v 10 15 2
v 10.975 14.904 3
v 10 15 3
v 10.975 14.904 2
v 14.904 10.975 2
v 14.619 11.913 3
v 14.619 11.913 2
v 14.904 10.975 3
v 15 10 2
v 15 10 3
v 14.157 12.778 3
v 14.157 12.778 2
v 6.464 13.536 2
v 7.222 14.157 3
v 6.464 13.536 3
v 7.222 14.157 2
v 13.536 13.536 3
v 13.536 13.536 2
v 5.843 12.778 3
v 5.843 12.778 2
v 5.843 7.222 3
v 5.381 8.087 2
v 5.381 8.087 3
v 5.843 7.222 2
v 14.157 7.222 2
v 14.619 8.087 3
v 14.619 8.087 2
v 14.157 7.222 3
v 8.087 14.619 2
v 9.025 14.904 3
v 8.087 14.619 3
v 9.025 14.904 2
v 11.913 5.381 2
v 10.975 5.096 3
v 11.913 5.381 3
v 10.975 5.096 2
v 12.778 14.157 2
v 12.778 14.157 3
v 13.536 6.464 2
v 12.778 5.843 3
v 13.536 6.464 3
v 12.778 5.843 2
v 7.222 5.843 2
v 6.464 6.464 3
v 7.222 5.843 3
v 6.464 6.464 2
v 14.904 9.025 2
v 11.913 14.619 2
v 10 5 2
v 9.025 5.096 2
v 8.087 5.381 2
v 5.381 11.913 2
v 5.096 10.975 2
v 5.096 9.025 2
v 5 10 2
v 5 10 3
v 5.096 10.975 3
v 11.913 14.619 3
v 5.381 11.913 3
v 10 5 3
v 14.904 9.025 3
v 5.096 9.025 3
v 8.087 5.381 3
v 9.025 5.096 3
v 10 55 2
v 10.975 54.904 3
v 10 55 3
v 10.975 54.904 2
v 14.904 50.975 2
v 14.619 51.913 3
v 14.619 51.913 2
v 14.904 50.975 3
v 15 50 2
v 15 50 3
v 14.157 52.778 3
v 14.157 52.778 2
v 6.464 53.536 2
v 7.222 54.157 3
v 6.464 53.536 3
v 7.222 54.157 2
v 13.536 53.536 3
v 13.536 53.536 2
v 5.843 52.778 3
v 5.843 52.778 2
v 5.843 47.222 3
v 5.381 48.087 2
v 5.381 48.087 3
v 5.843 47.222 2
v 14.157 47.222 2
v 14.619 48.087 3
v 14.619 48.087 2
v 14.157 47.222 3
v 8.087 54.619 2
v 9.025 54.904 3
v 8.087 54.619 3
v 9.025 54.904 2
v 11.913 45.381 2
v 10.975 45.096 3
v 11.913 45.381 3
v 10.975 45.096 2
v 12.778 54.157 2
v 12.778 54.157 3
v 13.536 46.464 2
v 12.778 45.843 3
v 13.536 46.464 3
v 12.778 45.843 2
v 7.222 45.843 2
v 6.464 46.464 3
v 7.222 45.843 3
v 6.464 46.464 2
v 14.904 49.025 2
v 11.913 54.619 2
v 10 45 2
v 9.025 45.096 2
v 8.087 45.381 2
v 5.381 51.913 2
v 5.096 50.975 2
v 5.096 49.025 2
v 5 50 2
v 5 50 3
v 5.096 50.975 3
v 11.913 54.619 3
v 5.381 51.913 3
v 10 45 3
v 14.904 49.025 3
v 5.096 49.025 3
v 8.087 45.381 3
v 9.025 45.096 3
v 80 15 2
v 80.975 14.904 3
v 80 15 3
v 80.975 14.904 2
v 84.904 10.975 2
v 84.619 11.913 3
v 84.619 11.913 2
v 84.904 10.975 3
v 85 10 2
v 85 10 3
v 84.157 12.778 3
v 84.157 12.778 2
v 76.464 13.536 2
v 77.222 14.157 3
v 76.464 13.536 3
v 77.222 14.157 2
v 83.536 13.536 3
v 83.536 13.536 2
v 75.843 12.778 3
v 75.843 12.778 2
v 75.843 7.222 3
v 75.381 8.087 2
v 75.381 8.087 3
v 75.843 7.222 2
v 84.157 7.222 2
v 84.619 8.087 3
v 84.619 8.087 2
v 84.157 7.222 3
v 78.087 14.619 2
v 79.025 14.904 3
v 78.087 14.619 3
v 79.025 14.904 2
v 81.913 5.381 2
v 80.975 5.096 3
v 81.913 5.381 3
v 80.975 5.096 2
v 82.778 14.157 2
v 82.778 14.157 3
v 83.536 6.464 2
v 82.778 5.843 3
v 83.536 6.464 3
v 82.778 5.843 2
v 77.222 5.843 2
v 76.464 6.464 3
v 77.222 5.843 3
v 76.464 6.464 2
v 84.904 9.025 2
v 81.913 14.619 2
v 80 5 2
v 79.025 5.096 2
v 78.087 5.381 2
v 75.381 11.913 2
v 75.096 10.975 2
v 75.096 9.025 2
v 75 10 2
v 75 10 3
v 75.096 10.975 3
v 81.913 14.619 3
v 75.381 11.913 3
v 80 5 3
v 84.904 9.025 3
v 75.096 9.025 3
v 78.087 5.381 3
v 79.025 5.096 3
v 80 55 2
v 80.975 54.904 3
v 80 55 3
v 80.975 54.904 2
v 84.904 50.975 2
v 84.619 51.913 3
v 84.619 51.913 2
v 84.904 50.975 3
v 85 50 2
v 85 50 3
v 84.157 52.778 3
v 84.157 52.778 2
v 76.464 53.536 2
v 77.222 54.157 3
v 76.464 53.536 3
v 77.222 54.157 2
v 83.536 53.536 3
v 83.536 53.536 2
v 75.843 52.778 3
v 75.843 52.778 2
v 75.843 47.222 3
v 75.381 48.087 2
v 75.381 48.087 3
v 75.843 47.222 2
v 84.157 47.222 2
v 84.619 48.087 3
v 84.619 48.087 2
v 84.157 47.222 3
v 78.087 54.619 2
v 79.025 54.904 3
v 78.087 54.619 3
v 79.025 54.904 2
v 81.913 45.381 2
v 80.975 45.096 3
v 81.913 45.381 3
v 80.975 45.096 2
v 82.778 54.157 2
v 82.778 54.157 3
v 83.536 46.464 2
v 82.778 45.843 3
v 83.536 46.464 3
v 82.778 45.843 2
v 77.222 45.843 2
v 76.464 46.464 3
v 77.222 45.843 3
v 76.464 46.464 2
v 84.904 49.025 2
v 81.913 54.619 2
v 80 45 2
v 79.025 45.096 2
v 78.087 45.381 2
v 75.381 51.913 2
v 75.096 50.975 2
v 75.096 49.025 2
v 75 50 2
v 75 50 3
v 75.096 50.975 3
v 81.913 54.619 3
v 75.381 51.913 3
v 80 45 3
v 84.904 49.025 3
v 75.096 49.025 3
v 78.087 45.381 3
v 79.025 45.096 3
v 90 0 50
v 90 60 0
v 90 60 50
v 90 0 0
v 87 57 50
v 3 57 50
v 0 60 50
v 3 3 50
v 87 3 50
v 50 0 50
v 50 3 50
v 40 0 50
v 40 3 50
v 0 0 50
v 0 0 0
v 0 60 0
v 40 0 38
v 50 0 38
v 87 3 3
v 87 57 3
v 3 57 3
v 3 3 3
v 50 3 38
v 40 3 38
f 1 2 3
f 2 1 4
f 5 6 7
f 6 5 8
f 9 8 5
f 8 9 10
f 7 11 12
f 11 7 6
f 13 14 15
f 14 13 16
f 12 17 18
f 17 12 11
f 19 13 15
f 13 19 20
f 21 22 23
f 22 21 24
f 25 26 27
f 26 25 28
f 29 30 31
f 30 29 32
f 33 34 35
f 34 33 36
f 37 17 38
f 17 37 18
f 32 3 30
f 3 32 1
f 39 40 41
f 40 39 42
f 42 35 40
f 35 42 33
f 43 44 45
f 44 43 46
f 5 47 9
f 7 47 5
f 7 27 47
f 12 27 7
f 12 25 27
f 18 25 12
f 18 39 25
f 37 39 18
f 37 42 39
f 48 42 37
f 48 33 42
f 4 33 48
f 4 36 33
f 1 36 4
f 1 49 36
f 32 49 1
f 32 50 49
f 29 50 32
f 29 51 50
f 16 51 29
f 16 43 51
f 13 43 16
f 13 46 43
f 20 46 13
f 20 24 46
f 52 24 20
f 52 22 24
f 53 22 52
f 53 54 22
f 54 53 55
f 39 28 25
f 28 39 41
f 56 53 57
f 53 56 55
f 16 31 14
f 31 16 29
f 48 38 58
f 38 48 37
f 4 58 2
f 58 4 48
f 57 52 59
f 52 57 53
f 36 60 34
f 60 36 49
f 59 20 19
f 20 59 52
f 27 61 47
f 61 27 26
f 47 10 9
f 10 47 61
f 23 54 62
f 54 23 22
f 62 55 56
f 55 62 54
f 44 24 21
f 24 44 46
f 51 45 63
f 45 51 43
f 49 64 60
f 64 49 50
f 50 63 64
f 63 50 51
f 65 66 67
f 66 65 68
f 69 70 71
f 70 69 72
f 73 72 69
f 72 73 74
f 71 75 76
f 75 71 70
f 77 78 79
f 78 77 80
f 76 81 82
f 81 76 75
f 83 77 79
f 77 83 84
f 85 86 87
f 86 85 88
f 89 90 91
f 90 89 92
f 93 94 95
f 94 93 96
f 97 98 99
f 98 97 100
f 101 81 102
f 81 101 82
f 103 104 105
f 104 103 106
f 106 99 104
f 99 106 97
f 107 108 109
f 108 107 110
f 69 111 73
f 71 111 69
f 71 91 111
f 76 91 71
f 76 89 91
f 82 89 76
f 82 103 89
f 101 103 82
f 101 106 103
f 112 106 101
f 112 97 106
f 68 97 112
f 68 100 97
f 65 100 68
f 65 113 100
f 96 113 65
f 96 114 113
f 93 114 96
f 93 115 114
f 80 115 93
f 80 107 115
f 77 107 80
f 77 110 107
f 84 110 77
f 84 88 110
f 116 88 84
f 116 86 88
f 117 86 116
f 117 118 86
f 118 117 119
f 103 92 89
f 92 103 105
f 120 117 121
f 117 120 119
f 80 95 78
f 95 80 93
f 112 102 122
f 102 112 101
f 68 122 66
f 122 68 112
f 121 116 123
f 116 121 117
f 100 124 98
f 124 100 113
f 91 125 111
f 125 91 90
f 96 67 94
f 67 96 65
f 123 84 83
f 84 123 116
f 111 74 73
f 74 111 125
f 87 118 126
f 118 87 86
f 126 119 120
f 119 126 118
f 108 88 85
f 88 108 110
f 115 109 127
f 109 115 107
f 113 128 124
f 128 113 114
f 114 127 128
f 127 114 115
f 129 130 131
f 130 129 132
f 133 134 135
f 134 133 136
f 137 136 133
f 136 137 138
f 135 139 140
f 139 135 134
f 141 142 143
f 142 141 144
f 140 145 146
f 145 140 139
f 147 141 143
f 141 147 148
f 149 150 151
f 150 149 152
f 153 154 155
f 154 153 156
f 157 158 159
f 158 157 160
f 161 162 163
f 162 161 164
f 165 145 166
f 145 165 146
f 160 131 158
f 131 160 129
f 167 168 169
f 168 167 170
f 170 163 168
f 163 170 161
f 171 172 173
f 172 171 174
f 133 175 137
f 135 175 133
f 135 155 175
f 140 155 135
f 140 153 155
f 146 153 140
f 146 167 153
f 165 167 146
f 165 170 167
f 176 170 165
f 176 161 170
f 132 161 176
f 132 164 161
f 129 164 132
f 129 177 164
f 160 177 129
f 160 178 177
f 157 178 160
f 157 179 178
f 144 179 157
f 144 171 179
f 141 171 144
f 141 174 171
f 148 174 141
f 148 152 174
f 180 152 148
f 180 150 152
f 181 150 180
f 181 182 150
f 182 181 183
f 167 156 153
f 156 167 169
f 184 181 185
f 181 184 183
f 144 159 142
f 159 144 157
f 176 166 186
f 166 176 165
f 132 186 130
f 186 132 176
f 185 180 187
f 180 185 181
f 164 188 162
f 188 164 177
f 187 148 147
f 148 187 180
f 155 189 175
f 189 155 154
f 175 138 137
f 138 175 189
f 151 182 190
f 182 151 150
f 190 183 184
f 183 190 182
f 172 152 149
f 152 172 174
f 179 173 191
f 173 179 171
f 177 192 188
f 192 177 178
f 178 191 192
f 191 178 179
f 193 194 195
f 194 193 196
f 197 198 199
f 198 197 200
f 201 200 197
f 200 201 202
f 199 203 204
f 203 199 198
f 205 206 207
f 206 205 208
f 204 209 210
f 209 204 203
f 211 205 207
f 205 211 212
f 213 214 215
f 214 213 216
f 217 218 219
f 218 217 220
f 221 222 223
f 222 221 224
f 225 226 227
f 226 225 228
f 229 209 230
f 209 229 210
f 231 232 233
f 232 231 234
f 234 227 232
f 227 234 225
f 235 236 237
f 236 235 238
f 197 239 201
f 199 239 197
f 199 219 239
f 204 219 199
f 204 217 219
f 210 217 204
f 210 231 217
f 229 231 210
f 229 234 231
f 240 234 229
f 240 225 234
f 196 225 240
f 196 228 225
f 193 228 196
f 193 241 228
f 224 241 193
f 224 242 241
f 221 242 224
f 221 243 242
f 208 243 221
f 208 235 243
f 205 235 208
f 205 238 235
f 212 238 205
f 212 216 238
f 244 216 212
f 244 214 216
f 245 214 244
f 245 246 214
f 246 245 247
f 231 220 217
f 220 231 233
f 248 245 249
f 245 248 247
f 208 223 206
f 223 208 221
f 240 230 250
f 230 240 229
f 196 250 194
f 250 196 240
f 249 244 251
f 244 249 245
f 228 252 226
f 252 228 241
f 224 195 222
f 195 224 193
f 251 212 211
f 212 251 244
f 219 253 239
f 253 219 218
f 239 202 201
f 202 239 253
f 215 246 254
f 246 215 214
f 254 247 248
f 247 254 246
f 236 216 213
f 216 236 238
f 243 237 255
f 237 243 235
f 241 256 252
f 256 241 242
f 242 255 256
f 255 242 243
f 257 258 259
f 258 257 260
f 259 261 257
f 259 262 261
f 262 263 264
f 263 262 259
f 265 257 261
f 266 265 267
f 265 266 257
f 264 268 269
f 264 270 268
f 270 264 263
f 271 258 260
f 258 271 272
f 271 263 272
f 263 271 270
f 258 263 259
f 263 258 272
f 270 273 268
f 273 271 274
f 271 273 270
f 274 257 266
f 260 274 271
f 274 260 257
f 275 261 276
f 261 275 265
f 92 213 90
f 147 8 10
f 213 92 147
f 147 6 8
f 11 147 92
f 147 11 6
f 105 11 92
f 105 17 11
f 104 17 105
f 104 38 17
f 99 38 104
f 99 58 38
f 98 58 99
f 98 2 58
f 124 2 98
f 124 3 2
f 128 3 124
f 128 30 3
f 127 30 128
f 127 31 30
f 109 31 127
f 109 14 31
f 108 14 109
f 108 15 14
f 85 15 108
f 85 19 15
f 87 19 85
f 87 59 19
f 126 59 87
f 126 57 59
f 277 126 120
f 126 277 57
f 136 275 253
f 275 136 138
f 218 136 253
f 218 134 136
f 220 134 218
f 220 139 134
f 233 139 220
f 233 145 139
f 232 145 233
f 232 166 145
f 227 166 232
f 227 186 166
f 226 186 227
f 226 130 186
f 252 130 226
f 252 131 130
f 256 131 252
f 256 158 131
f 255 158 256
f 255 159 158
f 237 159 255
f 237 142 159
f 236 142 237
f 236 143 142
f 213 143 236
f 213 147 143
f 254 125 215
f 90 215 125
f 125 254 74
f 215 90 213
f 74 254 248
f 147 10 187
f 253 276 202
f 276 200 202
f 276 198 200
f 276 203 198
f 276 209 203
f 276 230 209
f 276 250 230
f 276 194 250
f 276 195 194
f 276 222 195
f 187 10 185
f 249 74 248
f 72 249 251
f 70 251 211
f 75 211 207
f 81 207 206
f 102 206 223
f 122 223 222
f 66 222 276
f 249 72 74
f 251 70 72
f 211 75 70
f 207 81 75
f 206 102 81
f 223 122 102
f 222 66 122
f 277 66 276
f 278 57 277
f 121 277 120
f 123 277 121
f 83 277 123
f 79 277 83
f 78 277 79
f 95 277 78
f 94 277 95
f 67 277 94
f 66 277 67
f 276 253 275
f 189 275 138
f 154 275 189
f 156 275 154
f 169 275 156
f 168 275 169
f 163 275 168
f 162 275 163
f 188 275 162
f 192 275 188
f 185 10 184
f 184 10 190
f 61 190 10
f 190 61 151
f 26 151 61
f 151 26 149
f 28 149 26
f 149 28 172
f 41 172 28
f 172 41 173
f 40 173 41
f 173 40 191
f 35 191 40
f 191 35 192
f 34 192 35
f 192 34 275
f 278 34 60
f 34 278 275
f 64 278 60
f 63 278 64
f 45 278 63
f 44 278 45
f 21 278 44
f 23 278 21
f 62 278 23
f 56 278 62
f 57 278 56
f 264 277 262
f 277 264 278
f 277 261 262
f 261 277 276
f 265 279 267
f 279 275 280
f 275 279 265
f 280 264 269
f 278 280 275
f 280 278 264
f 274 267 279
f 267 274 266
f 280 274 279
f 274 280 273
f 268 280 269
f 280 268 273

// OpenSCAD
$fn = 32;

// ----------------------------------------------------------------------
// Enclosure box: both enclosure
// ----------------------------------------------------------------------

// --- parameters (mm) ---
box_l = 90;               // outer length, X
box_w = 60;               // outer width, Y
box_h = 50;               // outer height
wall_t = 3;               // wall thickness
boss_r = 5;               // corner boss radius
hole_r = 1.5;             // boss screw hole radius
boss_in = 10;             // boss inset from the corners
notch_w = 10;             // cable notch width
notch_h = 12;             // cable notch height

inner_h = box_h - wall_t;  // cavity depth
boss_h = inner_h - 2;  // corner boss height

difference() {
  cube([box_l, box_w, box_h]);
  translate([wall_t, wall_t, wall_t])
    cube([box_l - 2 * wall_t, box_w - 2 * wall_t, box_h]);
  for (sx = [0, 1], sy = [0, 1])
    translate([sx ? box_l - boss_in : boss_in,
               sy ? box_w - boss_in : boss_in, wall_t - 1]) {
      cylinder(r = boss_r, h = boss_h);
      translate([0, 0, boss_h - 4])
        cylinder(r = hole_r, h = 5);
    }
  translate([box_l / 2 - notch_w / 2, -1, box_h - notch_h])
    cube([notch_w, wall_t + 2, notch_h + 1]);
}
